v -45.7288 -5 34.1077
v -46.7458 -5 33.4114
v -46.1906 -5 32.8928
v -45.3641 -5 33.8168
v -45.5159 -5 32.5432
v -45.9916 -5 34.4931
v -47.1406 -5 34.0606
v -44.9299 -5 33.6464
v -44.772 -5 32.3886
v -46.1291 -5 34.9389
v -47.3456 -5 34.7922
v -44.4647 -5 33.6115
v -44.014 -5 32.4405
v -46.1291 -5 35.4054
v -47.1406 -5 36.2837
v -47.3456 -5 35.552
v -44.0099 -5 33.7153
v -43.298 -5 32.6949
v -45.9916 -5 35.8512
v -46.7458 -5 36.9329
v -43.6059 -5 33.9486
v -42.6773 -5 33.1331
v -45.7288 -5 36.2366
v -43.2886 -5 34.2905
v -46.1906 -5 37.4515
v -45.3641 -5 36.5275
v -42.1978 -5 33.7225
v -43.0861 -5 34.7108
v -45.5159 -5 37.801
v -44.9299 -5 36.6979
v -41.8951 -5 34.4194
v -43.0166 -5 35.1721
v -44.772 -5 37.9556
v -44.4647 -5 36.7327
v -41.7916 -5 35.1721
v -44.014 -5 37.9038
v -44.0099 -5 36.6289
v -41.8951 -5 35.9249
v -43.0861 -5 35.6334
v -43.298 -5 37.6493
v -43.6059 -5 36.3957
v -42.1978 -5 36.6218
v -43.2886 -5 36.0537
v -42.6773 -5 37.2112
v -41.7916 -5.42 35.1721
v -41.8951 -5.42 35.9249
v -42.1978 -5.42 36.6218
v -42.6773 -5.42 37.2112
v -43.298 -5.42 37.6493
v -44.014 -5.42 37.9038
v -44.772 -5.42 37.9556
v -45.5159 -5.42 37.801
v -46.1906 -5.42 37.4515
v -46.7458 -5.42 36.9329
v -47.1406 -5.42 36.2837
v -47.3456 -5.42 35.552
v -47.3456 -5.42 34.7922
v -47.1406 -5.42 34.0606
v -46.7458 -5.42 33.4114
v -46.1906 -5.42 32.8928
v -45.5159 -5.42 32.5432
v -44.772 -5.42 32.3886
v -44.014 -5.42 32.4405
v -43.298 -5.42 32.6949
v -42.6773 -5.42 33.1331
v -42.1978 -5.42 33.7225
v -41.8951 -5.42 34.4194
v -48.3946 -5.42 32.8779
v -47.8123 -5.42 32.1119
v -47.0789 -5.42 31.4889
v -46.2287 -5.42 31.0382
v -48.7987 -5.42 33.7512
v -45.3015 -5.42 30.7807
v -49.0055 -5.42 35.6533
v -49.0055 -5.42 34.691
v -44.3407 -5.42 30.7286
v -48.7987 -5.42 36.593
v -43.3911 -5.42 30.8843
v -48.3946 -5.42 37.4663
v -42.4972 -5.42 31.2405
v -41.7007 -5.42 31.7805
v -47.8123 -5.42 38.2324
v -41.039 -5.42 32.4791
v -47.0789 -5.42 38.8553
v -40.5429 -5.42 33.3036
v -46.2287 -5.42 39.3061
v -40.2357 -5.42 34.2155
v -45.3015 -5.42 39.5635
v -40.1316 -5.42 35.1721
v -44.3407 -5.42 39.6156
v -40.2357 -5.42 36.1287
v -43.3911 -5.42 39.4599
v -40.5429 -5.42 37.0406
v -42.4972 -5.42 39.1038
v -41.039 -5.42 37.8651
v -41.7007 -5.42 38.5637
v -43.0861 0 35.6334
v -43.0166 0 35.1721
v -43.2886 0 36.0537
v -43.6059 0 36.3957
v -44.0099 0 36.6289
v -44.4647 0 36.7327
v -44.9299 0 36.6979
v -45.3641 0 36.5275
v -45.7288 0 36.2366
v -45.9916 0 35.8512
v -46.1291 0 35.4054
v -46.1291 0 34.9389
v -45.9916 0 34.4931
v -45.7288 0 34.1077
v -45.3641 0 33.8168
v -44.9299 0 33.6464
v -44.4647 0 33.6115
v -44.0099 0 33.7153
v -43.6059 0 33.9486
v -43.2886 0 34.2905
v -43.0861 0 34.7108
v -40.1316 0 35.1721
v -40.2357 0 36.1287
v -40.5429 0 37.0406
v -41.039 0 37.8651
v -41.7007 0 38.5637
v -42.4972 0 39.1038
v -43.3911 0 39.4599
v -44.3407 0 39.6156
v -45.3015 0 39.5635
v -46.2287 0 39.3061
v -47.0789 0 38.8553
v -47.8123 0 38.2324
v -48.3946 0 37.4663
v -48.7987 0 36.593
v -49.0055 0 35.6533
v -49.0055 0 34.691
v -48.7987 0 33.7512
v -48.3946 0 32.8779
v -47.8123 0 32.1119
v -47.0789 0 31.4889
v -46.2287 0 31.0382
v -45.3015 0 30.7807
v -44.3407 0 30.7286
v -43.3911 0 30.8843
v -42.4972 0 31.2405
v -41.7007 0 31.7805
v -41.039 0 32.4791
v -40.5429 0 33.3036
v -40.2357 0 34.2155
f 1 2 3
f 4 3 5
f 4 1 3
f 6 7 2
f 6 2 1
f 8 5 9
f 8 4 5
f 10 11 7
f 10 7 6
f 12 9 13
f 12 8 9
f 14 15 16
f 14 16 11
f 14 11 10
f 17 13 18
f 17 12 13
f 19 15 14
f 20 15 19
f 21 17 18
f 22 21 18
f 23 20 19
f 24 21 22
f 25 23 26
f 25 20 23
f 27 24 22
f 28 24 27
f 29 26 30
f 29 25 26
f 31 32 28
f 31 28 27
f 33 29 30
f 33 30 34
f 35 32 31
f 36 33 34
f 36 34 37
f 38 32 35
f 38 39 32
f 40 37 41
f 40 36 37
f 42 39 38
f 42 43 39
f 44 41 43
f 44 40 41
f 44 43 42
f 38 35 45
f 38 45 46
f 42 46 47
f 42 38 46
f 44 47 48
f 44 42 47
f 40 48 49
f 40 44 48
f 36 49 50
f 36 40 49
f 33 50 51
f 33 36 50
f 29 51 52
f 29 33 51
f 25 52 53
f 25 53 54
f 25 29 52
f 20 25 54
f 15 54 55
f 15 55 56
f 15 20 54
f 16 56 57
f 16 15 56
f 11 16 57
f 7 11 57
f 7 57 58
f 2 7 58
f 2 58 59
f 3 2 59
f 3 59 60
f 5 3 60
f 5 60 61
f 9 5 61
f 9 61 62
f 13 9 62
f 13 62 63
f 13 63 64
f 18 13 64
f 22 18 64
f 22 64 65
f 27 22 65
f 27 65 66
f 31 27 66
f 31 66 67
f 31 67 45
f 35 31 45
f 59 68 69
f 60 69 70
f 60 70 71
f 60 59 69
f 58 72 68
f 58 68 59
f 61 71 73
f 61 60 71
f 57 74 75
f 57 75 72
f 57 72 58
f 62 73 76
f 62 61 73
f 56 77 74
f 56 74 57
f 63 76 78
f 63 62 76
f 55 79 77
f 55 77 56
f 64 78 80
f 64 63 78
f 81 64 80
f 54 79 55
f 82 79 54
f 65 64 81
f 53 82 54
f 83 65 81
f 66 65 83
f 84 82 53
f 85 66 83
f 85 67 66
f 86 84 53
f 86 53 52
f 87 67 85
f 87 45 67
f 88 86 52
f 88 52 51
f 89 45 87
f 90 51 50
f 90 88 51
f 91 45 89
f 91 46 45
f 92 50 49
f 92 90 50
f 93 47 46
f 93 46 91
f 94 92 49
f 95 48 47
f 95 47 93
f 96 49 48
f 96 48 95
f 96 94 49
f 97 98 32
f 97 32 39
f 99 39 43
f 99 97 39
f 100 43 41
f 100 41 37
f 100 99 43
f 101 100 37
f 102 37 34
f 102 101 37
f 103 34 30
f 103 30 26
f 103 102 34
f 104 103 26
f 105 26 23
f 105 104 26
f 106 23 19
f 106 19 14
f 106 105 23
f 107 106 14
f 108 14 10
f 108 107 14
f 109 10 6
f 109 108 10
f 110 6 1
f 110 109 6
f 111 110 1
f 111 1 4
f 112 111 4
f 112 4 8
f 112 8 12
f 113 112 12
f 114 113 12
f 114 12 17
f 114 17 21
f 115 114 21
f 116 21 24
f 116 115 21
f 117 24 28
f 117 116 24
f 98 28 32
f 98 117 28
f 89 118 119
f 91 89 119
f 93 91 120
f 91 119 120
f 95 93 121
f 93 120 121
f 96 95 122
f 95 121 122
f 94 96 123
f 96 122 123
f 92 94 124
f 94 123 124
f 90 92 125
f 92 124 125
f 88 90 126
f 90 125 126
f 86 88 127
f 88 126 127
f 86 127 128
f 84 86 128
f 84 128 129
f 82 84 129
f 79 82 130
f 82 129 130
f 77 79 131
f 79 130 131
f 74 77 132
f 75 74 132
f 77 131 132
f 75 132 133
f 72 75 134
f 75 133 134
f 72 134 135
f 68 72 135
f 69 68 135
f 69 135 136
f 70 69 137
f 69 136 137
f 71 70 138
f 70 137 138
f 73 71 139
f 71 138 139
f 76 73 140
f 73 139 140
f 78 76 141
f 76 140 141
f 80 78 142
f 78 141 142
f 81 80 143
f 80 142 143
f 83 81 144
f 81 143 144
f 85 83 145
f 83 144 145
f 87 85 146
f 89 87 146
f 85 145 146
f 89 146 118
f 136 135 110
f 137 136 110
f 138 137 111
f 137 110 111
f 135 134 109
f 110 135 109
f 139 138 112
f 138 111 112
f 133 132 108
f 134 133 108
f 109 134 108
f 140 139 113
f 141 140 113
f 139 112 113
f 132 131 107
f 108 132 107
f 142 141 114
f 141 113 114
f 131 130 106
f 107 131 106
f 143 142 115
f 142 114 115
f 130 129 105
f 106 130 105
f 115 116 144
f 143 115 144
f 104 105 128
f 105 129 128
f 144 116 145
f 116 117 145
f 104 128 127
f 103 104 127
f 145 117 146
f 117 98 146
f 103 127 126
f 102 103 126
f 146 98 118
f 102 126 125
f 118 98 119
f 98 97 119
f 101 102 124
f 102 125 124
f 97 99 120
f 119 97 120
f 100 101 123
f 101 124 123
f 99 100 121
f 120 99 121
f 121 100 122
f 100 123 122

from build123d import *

# Parameters (mm, degrees)
F0_R     = 4.45
F0_R_2   = 2.79
F1_DEPTH = 5.42
F0_R_3   = 1.565
F2_DEPTH = 5
F3_DEPTH = 5.42


with BuildPart() as f1:
    # F0 (on Front) → F1 (new body)
    with BuildSketch(Plane.XZ):
        with Locations((-44.581614, 35.172123)):
            Circle(F0_R)
        with Locations((-44.581614, 35.172123)):
            Circle(F0_R_2, mode=Mode.SUBTRACT)
    extrude(amount=F1_DEPTH)

    # F0 (on Front) → F2 (join)
    with BuildSketch(Plane.XZ):
        with Locations((-44.581614, 35.172123)):
            Circle(F0_R_2)
        with Locations((-44.581614, 35.172123)):
            Circle(F0_R_3, mode=Mode.SUBTRACT)
    extrude(amount=F2_DEPTH)

    # F0 (on Front) → F3 (cut)
    with BuildSketch(Plane.XZ):
        with Locations((-44.581614, 35.172123)):
            Circle(F0_R_3)
    extrude(amount=-F3_DEPTH, mode=Mode.SUBTRACT)


solid = f1.part
